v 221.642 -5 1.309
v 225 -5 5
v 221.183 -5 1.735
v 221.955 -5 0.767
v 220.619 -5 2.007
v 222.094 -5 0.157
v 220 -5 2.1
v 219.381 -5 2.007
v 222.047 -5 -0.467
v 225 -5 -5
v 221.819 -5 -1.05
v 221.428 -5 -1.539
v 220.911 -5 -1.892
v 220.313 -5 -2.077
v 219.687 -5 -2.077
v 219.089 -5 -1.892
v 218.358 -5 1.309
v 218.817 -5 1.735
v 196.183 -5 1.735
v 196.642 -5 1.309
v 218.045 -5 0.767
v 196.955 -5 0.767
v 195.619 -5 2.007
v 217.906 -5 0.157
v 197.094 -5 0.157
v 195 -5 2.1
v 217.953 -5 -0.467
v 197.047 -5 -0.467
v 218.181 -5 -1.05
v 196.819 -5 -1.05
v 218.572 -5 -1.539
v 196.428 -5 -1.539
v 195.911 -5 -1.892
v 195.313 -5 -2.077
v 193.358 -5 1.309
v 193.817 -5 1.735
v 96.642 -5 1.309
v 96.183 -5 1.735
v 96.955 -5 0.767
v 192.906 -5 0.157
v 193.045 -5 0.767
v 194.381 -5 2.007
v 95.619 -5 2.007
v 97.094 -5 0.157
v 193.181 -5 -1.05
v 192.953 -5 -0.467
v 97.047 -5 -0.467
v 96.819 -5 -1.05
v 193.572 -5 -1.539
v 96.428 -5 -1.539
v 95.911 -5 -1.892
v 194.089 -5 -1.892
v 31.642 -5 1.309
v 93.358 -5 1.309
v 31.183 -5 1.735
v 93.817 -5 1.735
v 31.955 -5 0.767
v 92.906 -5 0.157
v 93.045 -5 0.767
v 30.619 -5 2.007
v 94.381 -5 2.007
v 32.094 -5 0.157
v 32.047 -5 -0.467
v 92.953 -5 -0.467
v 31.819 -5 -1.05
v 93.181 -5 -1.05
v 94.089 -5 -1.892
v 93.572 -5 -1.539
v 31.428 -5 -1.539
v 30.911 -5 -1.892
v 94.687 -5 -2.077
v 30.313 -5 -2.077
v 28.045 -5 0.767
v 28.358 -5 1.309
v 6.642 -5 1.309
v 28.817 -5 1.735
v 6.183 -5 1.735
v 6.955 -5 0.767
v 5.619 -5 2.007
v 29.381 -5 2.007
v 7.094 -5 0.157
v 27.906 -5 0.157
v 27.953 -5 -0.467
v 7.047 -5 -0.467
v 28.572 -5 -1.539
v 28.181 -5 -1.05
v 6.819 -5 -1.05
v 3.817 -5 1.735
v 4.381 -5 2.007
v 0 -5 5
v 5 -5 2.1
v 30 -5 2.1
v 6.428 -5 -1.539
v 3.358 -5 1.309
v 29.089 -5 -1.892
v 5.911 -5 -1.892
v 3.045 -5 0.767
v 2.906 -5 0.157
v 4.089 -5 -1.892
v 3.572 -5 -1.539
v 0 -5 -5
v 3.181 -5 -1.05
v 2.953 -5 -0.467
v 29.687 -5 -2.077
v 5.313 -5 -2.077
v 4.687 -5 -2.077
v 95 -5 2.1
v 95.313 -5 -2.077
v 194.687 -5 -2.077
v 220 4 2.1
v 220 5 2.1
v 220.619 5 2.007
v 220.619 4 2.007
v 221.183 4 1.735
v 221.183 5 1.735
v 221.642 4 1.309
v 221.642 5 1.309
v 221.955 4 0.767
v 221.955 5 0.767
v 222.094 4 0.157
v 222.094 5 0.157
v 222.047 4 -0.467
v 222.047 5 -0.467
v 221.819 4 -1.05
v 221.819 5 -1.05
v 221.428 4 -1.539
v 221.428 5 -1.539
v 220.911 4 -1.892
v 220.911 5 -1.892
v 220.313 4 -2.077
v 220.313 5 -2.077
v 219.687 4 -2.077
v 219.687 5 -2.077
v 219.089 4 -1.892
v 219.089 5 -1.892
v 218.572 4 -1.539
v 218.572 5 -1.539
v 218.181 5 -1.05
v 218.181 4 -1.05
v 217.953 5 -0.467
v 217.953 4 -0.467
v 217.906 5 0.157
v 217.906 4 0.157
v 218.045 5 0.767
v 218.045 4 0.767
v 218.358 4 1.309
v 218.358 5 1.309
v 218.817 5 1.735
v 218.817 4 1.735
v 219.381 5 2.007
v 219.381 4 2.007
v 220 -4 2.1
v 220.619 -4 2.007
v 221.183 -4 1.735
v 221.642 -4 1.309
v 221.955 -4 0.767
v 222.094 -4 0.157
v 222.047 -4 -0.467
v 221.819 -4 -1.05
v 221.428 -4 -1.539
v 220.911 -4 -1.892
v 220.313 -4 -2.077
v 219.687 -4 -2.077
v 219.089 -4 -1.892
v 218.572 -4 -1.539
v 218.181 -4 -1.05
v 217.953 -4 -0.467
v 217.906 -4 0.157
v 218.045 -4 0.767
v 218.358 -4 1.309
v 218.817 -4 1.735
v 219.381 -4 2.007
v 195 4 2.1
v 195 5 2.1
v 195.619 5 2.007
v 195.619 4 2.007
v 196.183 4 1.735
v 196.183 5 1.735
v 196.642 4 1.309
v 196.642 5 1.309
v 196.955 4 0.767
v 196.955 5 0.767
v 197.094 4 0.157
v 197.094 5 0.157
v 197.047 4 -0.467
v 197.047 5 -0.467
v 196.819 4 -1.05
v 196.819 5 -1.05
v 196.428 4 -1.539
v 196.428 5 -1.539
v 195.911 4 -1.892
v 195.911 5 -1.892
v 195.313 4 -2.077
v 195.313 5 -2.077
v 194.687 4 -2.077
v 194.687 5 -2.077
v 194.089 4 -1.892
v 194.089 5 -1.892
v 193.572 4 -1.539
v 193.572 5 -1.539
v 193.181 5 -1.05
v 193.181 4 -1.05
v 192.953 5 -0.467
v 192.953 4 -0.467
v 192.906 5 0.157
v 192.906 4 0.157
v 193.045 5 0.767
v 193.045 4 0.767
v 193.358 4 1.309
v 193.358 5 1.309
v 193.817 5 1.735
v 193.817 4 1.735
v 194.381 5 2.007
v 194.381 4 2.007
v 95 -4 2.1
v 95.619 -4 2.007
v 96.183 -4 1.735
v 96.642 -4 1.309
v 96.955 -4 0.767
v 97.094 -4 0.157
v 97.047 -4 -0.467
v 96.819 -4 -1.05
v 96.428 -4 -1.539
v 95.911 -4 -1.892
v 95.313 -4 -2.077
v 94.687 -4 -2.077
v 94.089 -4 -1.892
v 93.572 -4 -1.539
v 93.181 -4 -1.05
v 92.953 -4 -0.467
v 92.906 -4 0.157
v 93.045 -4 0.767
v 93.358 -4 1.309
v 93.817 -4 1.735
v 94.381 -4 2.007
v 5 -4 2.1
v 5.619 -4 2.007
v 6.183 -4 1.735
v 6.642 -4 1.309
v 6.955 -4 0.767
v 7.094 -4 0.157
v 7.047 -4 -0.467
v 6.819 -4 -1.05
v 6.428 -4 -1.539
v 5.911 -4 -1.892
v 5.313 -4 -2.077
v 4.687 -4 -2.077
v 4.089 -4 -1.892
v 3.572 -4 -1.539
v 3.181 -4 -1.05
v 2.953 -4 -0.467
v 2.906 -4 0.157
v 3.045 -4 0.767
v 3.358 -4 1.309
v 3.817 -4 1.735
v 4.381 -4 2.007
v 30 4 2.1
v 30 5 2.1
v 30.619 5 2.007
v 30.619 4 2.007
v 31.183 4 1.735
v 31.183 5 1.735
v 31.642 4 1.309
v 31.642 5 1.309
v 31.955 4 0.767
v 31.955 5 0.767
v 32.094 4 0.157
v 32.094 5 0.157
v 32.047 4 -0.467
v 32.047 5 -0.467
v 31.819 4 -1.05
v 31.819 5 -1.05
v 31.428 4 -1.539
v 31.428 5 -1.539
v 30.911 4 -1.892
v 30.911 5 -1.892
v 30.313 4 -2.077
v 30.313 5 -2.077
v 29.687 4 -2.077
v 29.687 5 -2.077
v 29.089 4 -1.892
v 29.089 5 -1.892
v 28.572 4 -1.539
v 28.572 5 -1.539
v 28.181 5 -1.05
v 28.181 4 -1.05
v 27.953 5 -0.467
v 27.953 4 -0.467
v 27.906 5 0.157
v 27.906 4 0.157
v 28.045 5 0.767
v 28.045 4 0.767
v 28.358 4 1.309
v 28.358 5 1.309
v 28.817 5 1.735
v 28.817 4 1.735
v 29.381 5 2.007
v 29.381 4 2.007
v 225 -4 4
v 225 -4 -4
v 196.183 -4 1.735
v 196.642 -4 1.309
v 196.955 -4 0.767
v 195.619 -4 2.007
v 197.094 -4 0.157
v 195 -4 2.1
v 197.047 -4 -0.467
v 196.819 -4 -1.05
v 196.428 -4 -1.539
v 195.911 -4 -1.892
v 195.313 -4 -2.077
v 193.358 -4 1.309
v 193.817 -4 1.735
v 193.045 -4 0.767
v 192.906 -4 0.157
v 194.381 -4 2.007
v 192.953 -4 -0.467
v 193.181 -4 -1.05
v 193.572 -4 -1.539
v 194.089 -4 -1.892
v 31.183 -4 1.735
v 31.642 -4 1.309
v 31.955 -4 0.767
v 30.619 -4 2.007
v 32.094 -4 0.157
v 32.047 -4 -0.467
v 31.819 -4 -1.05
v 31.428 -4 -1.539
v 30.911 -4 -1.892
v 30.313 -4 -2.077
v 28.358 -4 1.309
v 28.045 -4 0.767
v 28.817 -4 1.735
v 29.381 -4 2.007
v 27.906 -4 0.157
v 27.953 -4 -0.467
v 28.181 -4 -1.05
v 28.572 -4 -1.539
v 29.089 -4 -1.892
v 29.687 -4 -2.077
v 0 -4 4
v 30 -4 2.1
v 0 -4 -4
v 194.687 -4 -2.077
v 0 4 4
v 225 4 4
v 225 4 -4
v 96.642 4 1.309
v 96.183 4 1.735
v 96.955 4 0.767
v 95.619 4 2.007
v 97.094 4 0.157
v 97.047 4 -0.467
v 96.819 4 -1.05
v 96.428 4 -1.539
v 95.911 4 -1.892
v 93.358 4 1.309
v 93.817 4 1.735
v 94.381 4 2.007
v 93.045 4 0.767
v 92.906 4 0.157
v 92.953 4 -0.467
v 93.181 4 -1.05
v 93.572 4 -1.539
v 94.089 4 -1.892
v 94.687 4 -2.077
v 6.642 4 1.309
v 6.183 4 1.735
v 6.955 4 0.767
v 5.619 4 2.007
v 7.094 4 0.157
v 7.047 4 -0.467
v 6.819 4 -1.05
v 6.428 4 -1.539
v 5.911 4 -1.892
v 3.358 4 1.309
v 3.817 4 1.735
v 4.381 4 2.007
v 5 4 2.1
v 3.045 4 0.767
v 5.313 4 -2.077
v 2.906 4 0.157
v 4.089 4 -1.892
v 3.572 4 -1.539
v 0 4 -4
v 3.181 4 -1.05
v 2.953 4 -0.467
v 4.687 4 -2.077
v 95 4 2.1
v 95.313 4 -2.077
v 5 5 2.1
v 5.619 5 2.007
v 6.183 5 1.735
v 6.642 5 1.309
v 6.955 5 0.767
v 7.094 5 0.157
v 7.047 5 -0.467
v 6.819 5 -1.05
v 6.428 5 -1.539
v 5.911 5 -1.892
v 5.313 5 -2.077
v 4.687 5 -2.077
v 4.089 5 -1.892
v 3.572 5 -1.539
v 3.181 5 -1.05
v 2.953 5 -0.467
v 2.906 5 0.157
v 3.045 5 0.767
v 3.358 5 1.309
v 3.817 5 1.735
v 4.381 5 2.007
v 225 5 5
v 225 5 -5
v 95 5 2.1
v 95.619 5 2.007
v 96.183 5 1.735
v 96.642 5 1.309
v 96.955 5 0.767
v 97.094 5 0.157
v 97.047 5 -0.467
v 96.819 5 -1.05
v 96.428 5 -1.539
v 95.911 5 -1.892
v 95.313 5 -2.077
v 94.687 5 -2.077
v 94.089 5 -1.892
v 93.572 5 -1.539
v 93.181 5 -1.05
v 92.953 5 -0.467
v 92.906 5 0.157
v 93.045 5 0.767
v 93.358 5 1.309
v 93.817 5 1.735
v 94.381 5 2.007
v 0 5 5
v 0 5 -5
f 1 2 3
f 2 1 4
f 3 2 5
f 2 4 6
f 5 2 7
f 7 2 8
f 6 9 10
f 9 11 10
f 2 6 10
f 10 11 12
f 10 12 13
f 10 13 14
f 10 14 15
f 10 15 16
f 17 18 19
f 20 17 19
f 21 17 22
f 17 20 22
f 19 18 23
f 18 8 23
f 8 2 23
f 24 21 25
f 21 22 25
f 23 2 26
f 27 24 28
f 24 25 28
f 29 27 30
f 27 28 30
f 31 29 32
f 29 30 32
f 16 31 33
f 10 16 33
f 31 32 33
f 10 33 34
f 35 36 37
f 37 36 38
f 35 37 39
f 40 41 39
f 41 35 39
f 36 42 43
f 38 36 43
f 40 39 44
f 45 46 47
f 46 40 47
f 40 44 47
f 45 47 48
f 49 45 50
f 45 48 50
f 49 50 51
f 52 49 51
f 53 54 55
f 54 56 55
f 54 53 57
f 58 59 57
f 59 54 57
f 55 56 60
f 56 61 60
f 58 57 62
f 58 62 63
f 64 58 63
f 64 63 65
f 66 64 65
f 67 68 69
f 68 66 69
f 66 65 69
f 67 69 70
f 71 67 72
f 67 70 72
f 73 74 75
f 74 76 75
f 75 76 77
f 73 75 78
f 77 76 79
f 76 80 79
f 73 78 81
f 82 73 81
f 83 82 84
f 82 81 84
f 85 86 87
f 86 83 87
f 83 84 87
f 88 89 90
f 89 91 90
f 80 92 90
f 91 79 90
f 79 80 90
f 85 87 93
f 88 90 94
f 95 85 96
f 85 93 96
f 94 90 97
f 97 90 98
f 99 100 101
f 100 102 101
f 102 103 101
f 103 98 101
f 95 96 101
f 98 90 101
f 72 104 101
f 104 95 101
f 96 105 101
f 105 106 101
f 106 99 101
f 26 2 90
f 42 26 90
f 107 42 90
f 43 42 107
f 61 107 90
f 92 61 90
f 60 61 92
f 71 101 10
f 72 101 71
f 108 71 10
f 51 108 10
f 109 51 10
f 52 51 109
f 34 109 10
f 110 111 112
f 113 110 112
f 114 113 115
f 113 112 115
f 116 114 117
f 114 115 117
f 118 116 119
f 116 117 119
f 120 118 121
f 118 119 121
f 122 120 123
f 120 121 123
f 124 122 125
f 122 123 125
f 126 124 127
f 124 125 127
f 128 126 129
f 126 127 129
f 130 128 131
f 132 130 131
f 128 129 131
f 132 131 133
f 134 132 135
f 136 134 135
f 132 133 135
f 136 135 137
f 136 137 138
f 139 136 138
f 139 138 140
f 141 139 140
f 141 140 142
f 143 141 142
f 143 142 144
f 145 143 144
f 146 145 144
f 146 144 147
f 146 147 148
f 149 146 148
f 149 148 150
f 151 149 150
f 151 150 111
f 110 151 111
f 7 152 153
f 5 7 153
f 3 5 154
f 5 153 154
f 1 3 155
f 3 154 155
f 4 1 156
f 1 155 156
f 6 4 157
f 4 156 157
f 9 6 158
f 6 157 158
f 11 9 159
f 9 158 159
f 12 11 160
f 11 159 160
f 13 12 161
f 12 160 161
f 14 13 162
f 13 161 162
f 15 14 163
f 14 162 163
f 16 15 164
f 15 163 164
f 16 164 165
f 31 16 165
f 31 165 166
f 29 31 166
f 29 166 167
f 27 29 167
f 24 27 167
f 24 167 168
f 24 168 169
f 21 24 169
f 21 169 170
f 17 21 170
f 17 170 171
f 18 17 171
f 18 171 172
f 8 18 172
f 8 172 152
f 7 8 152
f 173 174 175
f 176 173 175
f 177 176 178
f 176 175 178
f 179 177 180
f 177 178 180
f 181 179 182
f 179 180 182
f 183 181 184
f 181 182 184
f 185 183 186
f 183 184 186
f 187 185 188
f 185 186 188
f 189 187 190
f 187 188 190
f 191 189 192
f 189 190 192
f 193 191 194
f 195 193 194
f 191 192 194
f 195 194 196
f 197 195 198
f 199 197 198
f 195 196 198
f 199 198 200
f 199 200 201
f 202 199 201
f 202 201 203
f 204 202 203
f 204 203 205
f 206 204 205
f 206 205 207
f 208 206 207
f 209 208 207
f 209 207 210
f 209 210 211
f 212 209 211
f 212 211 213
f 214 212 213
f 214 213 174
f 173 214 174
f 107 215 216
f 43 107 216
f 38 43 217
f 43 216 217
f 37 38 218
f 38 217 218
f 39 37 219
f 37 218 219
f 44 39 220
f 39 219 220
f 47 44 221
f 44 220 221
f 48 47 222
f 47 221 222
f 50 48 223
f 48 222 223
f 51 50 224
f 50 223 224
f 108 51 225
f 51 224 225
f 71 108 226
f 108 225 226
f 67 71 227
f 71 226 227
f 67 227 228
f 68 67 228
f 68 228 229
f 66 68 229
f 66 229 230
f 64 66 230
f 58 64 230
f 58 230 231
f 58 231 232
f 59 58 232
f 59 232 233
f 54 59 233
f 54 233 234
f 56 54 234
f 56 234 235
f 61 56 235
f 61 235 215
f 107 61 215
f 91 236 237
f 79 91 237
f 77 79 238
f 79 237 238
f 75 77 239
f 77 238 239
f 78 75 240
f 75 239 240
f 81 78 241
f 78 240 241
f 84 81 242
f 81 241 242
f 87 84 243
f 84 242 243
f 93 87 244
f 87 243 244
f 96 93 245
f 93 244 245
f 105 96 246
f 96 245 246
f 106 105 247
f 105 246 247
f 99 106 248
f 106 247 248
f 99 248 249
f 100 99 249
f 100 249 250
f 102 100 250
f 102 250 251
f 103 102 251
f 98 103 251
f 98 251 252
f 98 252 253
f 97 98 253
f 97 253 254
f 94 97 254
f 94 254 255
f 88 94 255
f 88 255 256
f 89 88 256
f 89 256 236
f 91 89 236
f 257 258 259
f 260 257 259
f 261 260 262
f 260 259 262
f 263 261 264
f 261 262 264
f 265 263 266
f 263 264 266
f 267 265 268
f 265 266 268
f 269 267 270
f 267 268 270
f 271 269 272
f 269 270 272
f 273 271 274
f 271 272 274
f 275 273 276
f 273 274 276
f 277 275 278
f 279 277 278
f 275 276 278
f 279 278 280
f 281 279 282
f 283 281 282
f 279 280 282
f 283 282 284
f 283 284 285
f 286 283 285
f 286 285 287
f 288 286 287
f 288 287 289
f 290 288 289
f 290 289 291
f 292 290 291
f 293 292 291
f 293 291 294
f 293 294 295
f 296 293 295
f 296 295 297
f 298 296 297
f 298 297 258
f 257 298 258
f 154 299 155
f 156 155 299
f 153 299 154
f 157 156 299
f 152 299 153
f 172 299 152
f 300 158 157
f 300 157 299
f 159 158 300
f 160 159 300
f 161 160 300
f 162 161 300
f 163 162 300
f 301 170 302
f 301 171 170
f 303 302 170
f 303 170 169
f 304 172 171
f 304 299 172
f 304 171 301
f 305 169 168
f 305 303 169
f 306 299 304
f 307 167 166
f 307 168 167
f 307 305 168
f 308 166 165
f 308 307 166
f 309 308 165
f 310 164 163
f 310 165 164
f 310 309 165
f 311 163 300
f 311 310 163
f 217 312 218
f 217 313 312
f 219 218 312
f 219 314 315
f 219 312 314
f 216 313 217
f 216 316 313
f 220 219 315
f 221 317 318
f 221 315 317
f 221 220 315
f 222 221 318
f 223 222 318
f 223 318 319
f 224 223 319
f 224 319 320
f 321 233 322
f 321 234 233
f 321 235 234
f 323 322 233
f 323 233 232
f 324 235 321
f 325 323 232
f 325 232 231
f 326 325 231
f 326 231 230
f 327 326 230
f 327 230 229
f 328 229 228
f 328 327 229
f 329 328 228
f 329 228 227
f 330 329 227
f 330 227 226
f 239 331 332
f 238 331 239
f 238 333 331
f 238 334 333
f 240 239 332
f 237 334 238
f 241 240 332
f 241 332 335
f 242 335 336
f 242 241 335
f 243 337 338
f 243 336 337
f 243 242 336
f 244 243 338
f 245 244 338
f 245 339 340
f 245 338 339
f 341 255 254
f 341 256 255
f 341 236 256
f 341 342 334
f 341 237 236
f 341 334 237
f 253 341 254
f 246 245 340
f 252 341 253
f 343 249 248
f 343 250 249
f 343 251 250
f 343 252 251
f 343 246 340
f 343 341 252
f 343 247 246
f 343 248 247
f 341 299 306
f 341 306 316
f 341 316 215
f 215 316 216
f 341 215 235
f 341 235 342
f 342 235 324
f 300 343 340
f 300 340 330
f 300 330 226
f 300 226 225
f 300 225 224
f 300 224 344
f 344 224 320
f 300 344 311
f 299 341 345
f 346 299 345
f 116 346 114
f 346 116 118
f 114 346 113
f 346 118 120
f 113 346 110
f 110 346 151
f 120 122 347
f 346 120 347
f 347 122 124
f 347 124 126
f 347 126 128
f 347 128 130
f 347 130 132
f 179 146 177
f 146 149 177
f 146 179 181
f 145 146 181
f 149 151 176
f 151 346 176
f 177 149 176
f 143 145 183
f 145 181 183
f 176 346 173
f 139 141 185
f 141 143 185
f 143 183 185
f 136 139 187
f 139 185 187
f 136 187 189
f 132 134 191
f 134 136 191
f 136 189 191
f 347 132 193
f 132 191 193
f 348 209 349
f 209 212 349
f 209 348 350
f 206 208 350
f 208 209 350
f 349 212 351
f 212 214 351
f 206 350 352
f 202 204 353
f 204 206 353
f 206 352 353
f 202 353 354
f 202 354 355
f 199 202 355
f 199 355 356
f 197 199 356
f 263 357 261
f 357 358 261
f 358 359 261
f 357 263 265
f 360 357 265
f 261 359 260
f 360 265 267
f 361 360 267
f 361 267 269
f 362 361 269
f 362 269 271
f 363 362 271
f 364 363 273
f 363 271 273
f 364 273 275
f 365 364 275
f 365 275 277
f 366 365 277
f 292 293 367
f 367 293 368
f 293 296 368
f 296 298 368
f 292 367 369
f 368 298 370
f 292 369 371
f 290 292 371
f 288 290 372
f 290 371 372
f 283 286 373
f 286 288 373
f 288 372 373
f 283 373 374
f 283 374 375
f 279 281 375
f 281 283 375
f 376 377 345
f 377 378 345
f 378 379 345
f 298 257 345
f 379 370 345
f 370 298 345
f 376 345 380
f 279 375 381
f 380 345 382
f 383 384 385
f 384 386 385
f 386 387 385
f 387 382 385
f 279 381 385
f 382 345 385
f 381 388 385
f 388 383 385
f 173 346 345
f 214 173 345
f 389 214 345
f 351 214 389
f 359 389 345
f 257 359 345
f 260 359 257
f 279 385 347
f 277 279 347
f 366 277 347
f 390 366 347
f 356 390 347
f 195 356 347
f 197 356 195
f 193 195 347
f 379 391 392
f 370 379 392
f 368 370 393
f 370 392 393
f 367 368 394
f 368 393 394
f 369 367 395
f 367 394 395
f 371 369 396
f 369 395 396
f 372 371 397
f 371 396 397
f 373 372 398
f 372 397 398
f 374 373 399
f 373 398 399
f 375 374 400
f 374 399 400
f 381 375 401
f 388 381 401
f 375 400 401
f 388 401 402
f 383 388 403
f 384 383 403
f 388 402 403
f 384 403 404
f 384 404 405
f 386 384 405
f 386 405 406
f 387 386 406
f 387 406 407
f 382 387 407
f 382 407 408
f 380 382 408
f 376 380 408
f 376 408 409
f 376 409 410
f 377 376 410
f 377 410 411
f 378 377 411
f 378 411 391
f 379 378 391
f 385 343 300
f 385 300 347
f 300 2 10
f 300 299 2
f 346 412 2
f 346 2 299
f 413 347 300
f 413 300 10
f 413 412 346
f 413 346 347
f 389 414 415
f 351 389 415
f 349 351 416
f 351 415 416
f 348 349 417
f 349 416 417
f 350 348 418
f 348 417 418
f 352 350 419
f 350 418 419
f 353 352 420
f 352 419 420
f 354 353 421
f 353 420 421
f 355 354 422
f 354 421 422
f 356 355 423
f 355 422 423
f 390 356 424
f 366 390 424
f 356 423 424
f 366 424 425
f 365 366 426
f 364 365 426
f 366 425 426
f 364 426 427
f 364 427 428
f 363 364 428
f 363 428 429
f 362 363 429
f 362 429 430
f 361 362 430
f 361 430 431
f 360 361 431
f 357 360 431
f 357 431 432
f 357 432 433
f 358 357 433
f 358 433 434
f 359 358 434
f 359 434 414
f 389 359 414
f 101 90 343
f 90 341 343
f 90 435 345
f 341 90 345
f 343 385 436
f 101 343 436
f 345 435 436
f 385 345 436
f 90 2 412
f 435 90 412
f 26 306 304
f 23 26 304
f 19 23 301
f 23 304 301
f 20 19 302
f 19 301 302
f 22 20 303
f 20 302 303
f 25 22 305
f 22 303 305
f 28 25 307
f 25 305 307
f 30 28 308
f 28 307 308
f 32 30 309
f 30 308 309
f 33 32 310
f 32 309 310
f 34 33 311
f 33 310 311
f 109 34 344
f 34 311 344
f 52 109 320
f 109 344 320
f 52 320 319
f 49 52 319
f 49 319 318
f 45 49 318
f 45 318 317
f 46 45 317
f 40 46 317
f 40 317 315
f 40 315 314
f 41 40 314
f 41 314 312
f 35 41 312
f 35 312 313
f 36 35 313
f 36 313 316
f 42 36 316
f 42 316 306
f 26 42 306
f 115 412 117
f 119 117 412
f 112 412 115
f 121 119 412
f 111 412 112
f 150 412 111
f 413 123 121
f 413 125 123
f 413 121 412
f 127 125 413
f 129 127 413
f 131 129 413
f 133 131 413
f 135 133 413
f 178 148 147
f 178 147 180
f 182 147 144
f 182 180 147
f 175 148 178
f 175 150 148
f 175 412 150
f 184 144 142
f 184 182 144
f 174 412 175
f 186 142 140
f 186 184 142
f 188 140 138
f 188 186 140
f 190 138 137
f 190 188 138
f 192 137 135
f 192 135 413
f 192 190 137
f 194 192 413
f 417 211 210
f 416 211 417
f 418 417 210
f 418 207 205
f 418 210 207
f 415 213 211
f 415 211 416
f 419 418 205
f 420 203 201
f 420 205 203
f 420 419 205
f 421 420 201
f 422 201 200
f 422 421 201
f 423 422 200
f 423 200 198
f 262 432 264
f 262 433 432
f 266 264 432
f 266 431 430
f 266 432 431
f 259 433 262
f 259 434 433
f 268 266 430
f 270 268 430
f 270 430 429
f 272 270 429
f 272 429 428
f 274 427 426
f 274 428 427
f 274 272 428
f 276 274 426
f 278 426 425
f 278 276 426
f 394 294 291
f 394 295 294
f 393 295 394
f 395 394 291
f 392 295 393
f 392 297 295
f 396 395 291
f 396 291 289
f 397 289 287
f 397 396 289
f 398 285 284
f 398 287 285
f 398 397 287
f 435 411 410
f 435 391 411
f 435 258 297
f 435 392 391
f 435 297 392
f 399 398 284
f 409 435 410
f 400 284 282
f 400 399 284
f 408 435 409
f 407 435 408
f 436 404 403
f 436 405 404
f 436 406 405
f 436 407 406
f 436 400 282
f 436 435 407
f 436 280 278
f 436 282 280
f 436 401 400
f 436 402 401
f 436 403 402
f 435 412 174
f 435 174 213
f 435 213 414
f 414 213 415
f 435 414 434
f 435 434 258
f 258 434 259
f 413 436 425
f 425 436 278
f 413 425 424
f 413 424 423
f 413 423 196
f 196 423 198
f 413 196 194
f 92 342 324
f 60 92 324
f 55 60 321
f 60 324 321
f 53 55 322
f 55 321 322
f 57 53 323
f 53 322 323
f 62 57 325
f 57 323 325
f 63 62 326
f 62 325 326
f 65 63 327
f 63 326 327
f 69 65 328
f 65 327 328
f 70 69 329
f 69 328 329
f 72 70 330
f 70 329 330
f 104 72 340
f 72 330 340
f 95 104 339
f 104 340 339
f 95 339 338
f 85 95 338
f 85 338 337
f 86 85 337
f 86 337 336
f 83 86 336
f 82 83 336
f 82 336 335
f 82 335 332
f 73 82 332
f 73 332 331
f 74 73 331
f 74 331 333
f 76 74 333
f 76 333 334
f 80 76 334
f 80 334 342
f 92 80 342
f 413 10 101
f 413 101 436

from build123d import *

# Parameters (mm, degrees)
SKETCH_1_W          = 10
SKETCH_1_H          = 10
SKETCH_1_W_2        = 8
SKETCH_1_H_2        = 8
EXTRUDE_1_DEPTH     = 225
SKETCH_2_R          = 2.1
CUT_EXTRUDE_1_DEPTH = 226.277606521
SKETCH_3_R          = 2.1
CUT_EXTRUDE_2_DEPTH = 226.277606521


with BuildPart() as part:
    # ｽｹｯﾁ1 → 押し出し-薄板1 (new body)
    with BuildSketch(Plane(origin=(0, 0, 0), x_dir=(0, 0, -1), z_dir=(1, 0, 0))):
        Rectangle(SKETCH_1_W, SKETCH_1_H)
        Rectangle(SKETCH_1_W_2, SKETCH_1_H_2, mode=Mode.SUBTRACT)
    extrude(amount=EXTRUDE_1_DEPTH)

    # ｽｹｯﾁ2 → ｶｯﾄ - 押し出し1 (cut, through all)
    with BuildSketch(Plane(origin=(0, 5, 0), x_dir=(1, 0, 0), z_dir=(0, 1, 0))):
        with Locations(Location((195, 0, 0), (0, 0, 270))):
            Circle(SKETCH_2_R)
        with Locations(Location((220, 0, 0), (0, 0, 270))):
            Circle(SKETCH_2_R)
        with Locations(Location((5, 0, 0), (0, 0, 270))):
            Circle(SKETCH_2_R)
        with Locations(Location((30, 0, 0), (0, 0, 270))):
            Circle(SKETCH_2_R)
    extrude(amount=-CUT_EXTRUDE_1_DEPTH, mode=Mode.SUBTRACT)

    # ｽｹｯﾁ3 → ｶｯﾄ - 押し出し2 (cut, through all)
    with BuildSketch(Plane(origin=(0, 5, 0), x_dir=(1, 0, 0), z_dir=(0, 1, 0))):
        with Locations(Location((95, 0, 0), (0, 0, 270))):
            Circle(SKETCH_3_R)
    extrude(amount=-CUT_EXTRUDE_2_DEPTH, mode=Mode.SUBTRACT)


solid = part.part
